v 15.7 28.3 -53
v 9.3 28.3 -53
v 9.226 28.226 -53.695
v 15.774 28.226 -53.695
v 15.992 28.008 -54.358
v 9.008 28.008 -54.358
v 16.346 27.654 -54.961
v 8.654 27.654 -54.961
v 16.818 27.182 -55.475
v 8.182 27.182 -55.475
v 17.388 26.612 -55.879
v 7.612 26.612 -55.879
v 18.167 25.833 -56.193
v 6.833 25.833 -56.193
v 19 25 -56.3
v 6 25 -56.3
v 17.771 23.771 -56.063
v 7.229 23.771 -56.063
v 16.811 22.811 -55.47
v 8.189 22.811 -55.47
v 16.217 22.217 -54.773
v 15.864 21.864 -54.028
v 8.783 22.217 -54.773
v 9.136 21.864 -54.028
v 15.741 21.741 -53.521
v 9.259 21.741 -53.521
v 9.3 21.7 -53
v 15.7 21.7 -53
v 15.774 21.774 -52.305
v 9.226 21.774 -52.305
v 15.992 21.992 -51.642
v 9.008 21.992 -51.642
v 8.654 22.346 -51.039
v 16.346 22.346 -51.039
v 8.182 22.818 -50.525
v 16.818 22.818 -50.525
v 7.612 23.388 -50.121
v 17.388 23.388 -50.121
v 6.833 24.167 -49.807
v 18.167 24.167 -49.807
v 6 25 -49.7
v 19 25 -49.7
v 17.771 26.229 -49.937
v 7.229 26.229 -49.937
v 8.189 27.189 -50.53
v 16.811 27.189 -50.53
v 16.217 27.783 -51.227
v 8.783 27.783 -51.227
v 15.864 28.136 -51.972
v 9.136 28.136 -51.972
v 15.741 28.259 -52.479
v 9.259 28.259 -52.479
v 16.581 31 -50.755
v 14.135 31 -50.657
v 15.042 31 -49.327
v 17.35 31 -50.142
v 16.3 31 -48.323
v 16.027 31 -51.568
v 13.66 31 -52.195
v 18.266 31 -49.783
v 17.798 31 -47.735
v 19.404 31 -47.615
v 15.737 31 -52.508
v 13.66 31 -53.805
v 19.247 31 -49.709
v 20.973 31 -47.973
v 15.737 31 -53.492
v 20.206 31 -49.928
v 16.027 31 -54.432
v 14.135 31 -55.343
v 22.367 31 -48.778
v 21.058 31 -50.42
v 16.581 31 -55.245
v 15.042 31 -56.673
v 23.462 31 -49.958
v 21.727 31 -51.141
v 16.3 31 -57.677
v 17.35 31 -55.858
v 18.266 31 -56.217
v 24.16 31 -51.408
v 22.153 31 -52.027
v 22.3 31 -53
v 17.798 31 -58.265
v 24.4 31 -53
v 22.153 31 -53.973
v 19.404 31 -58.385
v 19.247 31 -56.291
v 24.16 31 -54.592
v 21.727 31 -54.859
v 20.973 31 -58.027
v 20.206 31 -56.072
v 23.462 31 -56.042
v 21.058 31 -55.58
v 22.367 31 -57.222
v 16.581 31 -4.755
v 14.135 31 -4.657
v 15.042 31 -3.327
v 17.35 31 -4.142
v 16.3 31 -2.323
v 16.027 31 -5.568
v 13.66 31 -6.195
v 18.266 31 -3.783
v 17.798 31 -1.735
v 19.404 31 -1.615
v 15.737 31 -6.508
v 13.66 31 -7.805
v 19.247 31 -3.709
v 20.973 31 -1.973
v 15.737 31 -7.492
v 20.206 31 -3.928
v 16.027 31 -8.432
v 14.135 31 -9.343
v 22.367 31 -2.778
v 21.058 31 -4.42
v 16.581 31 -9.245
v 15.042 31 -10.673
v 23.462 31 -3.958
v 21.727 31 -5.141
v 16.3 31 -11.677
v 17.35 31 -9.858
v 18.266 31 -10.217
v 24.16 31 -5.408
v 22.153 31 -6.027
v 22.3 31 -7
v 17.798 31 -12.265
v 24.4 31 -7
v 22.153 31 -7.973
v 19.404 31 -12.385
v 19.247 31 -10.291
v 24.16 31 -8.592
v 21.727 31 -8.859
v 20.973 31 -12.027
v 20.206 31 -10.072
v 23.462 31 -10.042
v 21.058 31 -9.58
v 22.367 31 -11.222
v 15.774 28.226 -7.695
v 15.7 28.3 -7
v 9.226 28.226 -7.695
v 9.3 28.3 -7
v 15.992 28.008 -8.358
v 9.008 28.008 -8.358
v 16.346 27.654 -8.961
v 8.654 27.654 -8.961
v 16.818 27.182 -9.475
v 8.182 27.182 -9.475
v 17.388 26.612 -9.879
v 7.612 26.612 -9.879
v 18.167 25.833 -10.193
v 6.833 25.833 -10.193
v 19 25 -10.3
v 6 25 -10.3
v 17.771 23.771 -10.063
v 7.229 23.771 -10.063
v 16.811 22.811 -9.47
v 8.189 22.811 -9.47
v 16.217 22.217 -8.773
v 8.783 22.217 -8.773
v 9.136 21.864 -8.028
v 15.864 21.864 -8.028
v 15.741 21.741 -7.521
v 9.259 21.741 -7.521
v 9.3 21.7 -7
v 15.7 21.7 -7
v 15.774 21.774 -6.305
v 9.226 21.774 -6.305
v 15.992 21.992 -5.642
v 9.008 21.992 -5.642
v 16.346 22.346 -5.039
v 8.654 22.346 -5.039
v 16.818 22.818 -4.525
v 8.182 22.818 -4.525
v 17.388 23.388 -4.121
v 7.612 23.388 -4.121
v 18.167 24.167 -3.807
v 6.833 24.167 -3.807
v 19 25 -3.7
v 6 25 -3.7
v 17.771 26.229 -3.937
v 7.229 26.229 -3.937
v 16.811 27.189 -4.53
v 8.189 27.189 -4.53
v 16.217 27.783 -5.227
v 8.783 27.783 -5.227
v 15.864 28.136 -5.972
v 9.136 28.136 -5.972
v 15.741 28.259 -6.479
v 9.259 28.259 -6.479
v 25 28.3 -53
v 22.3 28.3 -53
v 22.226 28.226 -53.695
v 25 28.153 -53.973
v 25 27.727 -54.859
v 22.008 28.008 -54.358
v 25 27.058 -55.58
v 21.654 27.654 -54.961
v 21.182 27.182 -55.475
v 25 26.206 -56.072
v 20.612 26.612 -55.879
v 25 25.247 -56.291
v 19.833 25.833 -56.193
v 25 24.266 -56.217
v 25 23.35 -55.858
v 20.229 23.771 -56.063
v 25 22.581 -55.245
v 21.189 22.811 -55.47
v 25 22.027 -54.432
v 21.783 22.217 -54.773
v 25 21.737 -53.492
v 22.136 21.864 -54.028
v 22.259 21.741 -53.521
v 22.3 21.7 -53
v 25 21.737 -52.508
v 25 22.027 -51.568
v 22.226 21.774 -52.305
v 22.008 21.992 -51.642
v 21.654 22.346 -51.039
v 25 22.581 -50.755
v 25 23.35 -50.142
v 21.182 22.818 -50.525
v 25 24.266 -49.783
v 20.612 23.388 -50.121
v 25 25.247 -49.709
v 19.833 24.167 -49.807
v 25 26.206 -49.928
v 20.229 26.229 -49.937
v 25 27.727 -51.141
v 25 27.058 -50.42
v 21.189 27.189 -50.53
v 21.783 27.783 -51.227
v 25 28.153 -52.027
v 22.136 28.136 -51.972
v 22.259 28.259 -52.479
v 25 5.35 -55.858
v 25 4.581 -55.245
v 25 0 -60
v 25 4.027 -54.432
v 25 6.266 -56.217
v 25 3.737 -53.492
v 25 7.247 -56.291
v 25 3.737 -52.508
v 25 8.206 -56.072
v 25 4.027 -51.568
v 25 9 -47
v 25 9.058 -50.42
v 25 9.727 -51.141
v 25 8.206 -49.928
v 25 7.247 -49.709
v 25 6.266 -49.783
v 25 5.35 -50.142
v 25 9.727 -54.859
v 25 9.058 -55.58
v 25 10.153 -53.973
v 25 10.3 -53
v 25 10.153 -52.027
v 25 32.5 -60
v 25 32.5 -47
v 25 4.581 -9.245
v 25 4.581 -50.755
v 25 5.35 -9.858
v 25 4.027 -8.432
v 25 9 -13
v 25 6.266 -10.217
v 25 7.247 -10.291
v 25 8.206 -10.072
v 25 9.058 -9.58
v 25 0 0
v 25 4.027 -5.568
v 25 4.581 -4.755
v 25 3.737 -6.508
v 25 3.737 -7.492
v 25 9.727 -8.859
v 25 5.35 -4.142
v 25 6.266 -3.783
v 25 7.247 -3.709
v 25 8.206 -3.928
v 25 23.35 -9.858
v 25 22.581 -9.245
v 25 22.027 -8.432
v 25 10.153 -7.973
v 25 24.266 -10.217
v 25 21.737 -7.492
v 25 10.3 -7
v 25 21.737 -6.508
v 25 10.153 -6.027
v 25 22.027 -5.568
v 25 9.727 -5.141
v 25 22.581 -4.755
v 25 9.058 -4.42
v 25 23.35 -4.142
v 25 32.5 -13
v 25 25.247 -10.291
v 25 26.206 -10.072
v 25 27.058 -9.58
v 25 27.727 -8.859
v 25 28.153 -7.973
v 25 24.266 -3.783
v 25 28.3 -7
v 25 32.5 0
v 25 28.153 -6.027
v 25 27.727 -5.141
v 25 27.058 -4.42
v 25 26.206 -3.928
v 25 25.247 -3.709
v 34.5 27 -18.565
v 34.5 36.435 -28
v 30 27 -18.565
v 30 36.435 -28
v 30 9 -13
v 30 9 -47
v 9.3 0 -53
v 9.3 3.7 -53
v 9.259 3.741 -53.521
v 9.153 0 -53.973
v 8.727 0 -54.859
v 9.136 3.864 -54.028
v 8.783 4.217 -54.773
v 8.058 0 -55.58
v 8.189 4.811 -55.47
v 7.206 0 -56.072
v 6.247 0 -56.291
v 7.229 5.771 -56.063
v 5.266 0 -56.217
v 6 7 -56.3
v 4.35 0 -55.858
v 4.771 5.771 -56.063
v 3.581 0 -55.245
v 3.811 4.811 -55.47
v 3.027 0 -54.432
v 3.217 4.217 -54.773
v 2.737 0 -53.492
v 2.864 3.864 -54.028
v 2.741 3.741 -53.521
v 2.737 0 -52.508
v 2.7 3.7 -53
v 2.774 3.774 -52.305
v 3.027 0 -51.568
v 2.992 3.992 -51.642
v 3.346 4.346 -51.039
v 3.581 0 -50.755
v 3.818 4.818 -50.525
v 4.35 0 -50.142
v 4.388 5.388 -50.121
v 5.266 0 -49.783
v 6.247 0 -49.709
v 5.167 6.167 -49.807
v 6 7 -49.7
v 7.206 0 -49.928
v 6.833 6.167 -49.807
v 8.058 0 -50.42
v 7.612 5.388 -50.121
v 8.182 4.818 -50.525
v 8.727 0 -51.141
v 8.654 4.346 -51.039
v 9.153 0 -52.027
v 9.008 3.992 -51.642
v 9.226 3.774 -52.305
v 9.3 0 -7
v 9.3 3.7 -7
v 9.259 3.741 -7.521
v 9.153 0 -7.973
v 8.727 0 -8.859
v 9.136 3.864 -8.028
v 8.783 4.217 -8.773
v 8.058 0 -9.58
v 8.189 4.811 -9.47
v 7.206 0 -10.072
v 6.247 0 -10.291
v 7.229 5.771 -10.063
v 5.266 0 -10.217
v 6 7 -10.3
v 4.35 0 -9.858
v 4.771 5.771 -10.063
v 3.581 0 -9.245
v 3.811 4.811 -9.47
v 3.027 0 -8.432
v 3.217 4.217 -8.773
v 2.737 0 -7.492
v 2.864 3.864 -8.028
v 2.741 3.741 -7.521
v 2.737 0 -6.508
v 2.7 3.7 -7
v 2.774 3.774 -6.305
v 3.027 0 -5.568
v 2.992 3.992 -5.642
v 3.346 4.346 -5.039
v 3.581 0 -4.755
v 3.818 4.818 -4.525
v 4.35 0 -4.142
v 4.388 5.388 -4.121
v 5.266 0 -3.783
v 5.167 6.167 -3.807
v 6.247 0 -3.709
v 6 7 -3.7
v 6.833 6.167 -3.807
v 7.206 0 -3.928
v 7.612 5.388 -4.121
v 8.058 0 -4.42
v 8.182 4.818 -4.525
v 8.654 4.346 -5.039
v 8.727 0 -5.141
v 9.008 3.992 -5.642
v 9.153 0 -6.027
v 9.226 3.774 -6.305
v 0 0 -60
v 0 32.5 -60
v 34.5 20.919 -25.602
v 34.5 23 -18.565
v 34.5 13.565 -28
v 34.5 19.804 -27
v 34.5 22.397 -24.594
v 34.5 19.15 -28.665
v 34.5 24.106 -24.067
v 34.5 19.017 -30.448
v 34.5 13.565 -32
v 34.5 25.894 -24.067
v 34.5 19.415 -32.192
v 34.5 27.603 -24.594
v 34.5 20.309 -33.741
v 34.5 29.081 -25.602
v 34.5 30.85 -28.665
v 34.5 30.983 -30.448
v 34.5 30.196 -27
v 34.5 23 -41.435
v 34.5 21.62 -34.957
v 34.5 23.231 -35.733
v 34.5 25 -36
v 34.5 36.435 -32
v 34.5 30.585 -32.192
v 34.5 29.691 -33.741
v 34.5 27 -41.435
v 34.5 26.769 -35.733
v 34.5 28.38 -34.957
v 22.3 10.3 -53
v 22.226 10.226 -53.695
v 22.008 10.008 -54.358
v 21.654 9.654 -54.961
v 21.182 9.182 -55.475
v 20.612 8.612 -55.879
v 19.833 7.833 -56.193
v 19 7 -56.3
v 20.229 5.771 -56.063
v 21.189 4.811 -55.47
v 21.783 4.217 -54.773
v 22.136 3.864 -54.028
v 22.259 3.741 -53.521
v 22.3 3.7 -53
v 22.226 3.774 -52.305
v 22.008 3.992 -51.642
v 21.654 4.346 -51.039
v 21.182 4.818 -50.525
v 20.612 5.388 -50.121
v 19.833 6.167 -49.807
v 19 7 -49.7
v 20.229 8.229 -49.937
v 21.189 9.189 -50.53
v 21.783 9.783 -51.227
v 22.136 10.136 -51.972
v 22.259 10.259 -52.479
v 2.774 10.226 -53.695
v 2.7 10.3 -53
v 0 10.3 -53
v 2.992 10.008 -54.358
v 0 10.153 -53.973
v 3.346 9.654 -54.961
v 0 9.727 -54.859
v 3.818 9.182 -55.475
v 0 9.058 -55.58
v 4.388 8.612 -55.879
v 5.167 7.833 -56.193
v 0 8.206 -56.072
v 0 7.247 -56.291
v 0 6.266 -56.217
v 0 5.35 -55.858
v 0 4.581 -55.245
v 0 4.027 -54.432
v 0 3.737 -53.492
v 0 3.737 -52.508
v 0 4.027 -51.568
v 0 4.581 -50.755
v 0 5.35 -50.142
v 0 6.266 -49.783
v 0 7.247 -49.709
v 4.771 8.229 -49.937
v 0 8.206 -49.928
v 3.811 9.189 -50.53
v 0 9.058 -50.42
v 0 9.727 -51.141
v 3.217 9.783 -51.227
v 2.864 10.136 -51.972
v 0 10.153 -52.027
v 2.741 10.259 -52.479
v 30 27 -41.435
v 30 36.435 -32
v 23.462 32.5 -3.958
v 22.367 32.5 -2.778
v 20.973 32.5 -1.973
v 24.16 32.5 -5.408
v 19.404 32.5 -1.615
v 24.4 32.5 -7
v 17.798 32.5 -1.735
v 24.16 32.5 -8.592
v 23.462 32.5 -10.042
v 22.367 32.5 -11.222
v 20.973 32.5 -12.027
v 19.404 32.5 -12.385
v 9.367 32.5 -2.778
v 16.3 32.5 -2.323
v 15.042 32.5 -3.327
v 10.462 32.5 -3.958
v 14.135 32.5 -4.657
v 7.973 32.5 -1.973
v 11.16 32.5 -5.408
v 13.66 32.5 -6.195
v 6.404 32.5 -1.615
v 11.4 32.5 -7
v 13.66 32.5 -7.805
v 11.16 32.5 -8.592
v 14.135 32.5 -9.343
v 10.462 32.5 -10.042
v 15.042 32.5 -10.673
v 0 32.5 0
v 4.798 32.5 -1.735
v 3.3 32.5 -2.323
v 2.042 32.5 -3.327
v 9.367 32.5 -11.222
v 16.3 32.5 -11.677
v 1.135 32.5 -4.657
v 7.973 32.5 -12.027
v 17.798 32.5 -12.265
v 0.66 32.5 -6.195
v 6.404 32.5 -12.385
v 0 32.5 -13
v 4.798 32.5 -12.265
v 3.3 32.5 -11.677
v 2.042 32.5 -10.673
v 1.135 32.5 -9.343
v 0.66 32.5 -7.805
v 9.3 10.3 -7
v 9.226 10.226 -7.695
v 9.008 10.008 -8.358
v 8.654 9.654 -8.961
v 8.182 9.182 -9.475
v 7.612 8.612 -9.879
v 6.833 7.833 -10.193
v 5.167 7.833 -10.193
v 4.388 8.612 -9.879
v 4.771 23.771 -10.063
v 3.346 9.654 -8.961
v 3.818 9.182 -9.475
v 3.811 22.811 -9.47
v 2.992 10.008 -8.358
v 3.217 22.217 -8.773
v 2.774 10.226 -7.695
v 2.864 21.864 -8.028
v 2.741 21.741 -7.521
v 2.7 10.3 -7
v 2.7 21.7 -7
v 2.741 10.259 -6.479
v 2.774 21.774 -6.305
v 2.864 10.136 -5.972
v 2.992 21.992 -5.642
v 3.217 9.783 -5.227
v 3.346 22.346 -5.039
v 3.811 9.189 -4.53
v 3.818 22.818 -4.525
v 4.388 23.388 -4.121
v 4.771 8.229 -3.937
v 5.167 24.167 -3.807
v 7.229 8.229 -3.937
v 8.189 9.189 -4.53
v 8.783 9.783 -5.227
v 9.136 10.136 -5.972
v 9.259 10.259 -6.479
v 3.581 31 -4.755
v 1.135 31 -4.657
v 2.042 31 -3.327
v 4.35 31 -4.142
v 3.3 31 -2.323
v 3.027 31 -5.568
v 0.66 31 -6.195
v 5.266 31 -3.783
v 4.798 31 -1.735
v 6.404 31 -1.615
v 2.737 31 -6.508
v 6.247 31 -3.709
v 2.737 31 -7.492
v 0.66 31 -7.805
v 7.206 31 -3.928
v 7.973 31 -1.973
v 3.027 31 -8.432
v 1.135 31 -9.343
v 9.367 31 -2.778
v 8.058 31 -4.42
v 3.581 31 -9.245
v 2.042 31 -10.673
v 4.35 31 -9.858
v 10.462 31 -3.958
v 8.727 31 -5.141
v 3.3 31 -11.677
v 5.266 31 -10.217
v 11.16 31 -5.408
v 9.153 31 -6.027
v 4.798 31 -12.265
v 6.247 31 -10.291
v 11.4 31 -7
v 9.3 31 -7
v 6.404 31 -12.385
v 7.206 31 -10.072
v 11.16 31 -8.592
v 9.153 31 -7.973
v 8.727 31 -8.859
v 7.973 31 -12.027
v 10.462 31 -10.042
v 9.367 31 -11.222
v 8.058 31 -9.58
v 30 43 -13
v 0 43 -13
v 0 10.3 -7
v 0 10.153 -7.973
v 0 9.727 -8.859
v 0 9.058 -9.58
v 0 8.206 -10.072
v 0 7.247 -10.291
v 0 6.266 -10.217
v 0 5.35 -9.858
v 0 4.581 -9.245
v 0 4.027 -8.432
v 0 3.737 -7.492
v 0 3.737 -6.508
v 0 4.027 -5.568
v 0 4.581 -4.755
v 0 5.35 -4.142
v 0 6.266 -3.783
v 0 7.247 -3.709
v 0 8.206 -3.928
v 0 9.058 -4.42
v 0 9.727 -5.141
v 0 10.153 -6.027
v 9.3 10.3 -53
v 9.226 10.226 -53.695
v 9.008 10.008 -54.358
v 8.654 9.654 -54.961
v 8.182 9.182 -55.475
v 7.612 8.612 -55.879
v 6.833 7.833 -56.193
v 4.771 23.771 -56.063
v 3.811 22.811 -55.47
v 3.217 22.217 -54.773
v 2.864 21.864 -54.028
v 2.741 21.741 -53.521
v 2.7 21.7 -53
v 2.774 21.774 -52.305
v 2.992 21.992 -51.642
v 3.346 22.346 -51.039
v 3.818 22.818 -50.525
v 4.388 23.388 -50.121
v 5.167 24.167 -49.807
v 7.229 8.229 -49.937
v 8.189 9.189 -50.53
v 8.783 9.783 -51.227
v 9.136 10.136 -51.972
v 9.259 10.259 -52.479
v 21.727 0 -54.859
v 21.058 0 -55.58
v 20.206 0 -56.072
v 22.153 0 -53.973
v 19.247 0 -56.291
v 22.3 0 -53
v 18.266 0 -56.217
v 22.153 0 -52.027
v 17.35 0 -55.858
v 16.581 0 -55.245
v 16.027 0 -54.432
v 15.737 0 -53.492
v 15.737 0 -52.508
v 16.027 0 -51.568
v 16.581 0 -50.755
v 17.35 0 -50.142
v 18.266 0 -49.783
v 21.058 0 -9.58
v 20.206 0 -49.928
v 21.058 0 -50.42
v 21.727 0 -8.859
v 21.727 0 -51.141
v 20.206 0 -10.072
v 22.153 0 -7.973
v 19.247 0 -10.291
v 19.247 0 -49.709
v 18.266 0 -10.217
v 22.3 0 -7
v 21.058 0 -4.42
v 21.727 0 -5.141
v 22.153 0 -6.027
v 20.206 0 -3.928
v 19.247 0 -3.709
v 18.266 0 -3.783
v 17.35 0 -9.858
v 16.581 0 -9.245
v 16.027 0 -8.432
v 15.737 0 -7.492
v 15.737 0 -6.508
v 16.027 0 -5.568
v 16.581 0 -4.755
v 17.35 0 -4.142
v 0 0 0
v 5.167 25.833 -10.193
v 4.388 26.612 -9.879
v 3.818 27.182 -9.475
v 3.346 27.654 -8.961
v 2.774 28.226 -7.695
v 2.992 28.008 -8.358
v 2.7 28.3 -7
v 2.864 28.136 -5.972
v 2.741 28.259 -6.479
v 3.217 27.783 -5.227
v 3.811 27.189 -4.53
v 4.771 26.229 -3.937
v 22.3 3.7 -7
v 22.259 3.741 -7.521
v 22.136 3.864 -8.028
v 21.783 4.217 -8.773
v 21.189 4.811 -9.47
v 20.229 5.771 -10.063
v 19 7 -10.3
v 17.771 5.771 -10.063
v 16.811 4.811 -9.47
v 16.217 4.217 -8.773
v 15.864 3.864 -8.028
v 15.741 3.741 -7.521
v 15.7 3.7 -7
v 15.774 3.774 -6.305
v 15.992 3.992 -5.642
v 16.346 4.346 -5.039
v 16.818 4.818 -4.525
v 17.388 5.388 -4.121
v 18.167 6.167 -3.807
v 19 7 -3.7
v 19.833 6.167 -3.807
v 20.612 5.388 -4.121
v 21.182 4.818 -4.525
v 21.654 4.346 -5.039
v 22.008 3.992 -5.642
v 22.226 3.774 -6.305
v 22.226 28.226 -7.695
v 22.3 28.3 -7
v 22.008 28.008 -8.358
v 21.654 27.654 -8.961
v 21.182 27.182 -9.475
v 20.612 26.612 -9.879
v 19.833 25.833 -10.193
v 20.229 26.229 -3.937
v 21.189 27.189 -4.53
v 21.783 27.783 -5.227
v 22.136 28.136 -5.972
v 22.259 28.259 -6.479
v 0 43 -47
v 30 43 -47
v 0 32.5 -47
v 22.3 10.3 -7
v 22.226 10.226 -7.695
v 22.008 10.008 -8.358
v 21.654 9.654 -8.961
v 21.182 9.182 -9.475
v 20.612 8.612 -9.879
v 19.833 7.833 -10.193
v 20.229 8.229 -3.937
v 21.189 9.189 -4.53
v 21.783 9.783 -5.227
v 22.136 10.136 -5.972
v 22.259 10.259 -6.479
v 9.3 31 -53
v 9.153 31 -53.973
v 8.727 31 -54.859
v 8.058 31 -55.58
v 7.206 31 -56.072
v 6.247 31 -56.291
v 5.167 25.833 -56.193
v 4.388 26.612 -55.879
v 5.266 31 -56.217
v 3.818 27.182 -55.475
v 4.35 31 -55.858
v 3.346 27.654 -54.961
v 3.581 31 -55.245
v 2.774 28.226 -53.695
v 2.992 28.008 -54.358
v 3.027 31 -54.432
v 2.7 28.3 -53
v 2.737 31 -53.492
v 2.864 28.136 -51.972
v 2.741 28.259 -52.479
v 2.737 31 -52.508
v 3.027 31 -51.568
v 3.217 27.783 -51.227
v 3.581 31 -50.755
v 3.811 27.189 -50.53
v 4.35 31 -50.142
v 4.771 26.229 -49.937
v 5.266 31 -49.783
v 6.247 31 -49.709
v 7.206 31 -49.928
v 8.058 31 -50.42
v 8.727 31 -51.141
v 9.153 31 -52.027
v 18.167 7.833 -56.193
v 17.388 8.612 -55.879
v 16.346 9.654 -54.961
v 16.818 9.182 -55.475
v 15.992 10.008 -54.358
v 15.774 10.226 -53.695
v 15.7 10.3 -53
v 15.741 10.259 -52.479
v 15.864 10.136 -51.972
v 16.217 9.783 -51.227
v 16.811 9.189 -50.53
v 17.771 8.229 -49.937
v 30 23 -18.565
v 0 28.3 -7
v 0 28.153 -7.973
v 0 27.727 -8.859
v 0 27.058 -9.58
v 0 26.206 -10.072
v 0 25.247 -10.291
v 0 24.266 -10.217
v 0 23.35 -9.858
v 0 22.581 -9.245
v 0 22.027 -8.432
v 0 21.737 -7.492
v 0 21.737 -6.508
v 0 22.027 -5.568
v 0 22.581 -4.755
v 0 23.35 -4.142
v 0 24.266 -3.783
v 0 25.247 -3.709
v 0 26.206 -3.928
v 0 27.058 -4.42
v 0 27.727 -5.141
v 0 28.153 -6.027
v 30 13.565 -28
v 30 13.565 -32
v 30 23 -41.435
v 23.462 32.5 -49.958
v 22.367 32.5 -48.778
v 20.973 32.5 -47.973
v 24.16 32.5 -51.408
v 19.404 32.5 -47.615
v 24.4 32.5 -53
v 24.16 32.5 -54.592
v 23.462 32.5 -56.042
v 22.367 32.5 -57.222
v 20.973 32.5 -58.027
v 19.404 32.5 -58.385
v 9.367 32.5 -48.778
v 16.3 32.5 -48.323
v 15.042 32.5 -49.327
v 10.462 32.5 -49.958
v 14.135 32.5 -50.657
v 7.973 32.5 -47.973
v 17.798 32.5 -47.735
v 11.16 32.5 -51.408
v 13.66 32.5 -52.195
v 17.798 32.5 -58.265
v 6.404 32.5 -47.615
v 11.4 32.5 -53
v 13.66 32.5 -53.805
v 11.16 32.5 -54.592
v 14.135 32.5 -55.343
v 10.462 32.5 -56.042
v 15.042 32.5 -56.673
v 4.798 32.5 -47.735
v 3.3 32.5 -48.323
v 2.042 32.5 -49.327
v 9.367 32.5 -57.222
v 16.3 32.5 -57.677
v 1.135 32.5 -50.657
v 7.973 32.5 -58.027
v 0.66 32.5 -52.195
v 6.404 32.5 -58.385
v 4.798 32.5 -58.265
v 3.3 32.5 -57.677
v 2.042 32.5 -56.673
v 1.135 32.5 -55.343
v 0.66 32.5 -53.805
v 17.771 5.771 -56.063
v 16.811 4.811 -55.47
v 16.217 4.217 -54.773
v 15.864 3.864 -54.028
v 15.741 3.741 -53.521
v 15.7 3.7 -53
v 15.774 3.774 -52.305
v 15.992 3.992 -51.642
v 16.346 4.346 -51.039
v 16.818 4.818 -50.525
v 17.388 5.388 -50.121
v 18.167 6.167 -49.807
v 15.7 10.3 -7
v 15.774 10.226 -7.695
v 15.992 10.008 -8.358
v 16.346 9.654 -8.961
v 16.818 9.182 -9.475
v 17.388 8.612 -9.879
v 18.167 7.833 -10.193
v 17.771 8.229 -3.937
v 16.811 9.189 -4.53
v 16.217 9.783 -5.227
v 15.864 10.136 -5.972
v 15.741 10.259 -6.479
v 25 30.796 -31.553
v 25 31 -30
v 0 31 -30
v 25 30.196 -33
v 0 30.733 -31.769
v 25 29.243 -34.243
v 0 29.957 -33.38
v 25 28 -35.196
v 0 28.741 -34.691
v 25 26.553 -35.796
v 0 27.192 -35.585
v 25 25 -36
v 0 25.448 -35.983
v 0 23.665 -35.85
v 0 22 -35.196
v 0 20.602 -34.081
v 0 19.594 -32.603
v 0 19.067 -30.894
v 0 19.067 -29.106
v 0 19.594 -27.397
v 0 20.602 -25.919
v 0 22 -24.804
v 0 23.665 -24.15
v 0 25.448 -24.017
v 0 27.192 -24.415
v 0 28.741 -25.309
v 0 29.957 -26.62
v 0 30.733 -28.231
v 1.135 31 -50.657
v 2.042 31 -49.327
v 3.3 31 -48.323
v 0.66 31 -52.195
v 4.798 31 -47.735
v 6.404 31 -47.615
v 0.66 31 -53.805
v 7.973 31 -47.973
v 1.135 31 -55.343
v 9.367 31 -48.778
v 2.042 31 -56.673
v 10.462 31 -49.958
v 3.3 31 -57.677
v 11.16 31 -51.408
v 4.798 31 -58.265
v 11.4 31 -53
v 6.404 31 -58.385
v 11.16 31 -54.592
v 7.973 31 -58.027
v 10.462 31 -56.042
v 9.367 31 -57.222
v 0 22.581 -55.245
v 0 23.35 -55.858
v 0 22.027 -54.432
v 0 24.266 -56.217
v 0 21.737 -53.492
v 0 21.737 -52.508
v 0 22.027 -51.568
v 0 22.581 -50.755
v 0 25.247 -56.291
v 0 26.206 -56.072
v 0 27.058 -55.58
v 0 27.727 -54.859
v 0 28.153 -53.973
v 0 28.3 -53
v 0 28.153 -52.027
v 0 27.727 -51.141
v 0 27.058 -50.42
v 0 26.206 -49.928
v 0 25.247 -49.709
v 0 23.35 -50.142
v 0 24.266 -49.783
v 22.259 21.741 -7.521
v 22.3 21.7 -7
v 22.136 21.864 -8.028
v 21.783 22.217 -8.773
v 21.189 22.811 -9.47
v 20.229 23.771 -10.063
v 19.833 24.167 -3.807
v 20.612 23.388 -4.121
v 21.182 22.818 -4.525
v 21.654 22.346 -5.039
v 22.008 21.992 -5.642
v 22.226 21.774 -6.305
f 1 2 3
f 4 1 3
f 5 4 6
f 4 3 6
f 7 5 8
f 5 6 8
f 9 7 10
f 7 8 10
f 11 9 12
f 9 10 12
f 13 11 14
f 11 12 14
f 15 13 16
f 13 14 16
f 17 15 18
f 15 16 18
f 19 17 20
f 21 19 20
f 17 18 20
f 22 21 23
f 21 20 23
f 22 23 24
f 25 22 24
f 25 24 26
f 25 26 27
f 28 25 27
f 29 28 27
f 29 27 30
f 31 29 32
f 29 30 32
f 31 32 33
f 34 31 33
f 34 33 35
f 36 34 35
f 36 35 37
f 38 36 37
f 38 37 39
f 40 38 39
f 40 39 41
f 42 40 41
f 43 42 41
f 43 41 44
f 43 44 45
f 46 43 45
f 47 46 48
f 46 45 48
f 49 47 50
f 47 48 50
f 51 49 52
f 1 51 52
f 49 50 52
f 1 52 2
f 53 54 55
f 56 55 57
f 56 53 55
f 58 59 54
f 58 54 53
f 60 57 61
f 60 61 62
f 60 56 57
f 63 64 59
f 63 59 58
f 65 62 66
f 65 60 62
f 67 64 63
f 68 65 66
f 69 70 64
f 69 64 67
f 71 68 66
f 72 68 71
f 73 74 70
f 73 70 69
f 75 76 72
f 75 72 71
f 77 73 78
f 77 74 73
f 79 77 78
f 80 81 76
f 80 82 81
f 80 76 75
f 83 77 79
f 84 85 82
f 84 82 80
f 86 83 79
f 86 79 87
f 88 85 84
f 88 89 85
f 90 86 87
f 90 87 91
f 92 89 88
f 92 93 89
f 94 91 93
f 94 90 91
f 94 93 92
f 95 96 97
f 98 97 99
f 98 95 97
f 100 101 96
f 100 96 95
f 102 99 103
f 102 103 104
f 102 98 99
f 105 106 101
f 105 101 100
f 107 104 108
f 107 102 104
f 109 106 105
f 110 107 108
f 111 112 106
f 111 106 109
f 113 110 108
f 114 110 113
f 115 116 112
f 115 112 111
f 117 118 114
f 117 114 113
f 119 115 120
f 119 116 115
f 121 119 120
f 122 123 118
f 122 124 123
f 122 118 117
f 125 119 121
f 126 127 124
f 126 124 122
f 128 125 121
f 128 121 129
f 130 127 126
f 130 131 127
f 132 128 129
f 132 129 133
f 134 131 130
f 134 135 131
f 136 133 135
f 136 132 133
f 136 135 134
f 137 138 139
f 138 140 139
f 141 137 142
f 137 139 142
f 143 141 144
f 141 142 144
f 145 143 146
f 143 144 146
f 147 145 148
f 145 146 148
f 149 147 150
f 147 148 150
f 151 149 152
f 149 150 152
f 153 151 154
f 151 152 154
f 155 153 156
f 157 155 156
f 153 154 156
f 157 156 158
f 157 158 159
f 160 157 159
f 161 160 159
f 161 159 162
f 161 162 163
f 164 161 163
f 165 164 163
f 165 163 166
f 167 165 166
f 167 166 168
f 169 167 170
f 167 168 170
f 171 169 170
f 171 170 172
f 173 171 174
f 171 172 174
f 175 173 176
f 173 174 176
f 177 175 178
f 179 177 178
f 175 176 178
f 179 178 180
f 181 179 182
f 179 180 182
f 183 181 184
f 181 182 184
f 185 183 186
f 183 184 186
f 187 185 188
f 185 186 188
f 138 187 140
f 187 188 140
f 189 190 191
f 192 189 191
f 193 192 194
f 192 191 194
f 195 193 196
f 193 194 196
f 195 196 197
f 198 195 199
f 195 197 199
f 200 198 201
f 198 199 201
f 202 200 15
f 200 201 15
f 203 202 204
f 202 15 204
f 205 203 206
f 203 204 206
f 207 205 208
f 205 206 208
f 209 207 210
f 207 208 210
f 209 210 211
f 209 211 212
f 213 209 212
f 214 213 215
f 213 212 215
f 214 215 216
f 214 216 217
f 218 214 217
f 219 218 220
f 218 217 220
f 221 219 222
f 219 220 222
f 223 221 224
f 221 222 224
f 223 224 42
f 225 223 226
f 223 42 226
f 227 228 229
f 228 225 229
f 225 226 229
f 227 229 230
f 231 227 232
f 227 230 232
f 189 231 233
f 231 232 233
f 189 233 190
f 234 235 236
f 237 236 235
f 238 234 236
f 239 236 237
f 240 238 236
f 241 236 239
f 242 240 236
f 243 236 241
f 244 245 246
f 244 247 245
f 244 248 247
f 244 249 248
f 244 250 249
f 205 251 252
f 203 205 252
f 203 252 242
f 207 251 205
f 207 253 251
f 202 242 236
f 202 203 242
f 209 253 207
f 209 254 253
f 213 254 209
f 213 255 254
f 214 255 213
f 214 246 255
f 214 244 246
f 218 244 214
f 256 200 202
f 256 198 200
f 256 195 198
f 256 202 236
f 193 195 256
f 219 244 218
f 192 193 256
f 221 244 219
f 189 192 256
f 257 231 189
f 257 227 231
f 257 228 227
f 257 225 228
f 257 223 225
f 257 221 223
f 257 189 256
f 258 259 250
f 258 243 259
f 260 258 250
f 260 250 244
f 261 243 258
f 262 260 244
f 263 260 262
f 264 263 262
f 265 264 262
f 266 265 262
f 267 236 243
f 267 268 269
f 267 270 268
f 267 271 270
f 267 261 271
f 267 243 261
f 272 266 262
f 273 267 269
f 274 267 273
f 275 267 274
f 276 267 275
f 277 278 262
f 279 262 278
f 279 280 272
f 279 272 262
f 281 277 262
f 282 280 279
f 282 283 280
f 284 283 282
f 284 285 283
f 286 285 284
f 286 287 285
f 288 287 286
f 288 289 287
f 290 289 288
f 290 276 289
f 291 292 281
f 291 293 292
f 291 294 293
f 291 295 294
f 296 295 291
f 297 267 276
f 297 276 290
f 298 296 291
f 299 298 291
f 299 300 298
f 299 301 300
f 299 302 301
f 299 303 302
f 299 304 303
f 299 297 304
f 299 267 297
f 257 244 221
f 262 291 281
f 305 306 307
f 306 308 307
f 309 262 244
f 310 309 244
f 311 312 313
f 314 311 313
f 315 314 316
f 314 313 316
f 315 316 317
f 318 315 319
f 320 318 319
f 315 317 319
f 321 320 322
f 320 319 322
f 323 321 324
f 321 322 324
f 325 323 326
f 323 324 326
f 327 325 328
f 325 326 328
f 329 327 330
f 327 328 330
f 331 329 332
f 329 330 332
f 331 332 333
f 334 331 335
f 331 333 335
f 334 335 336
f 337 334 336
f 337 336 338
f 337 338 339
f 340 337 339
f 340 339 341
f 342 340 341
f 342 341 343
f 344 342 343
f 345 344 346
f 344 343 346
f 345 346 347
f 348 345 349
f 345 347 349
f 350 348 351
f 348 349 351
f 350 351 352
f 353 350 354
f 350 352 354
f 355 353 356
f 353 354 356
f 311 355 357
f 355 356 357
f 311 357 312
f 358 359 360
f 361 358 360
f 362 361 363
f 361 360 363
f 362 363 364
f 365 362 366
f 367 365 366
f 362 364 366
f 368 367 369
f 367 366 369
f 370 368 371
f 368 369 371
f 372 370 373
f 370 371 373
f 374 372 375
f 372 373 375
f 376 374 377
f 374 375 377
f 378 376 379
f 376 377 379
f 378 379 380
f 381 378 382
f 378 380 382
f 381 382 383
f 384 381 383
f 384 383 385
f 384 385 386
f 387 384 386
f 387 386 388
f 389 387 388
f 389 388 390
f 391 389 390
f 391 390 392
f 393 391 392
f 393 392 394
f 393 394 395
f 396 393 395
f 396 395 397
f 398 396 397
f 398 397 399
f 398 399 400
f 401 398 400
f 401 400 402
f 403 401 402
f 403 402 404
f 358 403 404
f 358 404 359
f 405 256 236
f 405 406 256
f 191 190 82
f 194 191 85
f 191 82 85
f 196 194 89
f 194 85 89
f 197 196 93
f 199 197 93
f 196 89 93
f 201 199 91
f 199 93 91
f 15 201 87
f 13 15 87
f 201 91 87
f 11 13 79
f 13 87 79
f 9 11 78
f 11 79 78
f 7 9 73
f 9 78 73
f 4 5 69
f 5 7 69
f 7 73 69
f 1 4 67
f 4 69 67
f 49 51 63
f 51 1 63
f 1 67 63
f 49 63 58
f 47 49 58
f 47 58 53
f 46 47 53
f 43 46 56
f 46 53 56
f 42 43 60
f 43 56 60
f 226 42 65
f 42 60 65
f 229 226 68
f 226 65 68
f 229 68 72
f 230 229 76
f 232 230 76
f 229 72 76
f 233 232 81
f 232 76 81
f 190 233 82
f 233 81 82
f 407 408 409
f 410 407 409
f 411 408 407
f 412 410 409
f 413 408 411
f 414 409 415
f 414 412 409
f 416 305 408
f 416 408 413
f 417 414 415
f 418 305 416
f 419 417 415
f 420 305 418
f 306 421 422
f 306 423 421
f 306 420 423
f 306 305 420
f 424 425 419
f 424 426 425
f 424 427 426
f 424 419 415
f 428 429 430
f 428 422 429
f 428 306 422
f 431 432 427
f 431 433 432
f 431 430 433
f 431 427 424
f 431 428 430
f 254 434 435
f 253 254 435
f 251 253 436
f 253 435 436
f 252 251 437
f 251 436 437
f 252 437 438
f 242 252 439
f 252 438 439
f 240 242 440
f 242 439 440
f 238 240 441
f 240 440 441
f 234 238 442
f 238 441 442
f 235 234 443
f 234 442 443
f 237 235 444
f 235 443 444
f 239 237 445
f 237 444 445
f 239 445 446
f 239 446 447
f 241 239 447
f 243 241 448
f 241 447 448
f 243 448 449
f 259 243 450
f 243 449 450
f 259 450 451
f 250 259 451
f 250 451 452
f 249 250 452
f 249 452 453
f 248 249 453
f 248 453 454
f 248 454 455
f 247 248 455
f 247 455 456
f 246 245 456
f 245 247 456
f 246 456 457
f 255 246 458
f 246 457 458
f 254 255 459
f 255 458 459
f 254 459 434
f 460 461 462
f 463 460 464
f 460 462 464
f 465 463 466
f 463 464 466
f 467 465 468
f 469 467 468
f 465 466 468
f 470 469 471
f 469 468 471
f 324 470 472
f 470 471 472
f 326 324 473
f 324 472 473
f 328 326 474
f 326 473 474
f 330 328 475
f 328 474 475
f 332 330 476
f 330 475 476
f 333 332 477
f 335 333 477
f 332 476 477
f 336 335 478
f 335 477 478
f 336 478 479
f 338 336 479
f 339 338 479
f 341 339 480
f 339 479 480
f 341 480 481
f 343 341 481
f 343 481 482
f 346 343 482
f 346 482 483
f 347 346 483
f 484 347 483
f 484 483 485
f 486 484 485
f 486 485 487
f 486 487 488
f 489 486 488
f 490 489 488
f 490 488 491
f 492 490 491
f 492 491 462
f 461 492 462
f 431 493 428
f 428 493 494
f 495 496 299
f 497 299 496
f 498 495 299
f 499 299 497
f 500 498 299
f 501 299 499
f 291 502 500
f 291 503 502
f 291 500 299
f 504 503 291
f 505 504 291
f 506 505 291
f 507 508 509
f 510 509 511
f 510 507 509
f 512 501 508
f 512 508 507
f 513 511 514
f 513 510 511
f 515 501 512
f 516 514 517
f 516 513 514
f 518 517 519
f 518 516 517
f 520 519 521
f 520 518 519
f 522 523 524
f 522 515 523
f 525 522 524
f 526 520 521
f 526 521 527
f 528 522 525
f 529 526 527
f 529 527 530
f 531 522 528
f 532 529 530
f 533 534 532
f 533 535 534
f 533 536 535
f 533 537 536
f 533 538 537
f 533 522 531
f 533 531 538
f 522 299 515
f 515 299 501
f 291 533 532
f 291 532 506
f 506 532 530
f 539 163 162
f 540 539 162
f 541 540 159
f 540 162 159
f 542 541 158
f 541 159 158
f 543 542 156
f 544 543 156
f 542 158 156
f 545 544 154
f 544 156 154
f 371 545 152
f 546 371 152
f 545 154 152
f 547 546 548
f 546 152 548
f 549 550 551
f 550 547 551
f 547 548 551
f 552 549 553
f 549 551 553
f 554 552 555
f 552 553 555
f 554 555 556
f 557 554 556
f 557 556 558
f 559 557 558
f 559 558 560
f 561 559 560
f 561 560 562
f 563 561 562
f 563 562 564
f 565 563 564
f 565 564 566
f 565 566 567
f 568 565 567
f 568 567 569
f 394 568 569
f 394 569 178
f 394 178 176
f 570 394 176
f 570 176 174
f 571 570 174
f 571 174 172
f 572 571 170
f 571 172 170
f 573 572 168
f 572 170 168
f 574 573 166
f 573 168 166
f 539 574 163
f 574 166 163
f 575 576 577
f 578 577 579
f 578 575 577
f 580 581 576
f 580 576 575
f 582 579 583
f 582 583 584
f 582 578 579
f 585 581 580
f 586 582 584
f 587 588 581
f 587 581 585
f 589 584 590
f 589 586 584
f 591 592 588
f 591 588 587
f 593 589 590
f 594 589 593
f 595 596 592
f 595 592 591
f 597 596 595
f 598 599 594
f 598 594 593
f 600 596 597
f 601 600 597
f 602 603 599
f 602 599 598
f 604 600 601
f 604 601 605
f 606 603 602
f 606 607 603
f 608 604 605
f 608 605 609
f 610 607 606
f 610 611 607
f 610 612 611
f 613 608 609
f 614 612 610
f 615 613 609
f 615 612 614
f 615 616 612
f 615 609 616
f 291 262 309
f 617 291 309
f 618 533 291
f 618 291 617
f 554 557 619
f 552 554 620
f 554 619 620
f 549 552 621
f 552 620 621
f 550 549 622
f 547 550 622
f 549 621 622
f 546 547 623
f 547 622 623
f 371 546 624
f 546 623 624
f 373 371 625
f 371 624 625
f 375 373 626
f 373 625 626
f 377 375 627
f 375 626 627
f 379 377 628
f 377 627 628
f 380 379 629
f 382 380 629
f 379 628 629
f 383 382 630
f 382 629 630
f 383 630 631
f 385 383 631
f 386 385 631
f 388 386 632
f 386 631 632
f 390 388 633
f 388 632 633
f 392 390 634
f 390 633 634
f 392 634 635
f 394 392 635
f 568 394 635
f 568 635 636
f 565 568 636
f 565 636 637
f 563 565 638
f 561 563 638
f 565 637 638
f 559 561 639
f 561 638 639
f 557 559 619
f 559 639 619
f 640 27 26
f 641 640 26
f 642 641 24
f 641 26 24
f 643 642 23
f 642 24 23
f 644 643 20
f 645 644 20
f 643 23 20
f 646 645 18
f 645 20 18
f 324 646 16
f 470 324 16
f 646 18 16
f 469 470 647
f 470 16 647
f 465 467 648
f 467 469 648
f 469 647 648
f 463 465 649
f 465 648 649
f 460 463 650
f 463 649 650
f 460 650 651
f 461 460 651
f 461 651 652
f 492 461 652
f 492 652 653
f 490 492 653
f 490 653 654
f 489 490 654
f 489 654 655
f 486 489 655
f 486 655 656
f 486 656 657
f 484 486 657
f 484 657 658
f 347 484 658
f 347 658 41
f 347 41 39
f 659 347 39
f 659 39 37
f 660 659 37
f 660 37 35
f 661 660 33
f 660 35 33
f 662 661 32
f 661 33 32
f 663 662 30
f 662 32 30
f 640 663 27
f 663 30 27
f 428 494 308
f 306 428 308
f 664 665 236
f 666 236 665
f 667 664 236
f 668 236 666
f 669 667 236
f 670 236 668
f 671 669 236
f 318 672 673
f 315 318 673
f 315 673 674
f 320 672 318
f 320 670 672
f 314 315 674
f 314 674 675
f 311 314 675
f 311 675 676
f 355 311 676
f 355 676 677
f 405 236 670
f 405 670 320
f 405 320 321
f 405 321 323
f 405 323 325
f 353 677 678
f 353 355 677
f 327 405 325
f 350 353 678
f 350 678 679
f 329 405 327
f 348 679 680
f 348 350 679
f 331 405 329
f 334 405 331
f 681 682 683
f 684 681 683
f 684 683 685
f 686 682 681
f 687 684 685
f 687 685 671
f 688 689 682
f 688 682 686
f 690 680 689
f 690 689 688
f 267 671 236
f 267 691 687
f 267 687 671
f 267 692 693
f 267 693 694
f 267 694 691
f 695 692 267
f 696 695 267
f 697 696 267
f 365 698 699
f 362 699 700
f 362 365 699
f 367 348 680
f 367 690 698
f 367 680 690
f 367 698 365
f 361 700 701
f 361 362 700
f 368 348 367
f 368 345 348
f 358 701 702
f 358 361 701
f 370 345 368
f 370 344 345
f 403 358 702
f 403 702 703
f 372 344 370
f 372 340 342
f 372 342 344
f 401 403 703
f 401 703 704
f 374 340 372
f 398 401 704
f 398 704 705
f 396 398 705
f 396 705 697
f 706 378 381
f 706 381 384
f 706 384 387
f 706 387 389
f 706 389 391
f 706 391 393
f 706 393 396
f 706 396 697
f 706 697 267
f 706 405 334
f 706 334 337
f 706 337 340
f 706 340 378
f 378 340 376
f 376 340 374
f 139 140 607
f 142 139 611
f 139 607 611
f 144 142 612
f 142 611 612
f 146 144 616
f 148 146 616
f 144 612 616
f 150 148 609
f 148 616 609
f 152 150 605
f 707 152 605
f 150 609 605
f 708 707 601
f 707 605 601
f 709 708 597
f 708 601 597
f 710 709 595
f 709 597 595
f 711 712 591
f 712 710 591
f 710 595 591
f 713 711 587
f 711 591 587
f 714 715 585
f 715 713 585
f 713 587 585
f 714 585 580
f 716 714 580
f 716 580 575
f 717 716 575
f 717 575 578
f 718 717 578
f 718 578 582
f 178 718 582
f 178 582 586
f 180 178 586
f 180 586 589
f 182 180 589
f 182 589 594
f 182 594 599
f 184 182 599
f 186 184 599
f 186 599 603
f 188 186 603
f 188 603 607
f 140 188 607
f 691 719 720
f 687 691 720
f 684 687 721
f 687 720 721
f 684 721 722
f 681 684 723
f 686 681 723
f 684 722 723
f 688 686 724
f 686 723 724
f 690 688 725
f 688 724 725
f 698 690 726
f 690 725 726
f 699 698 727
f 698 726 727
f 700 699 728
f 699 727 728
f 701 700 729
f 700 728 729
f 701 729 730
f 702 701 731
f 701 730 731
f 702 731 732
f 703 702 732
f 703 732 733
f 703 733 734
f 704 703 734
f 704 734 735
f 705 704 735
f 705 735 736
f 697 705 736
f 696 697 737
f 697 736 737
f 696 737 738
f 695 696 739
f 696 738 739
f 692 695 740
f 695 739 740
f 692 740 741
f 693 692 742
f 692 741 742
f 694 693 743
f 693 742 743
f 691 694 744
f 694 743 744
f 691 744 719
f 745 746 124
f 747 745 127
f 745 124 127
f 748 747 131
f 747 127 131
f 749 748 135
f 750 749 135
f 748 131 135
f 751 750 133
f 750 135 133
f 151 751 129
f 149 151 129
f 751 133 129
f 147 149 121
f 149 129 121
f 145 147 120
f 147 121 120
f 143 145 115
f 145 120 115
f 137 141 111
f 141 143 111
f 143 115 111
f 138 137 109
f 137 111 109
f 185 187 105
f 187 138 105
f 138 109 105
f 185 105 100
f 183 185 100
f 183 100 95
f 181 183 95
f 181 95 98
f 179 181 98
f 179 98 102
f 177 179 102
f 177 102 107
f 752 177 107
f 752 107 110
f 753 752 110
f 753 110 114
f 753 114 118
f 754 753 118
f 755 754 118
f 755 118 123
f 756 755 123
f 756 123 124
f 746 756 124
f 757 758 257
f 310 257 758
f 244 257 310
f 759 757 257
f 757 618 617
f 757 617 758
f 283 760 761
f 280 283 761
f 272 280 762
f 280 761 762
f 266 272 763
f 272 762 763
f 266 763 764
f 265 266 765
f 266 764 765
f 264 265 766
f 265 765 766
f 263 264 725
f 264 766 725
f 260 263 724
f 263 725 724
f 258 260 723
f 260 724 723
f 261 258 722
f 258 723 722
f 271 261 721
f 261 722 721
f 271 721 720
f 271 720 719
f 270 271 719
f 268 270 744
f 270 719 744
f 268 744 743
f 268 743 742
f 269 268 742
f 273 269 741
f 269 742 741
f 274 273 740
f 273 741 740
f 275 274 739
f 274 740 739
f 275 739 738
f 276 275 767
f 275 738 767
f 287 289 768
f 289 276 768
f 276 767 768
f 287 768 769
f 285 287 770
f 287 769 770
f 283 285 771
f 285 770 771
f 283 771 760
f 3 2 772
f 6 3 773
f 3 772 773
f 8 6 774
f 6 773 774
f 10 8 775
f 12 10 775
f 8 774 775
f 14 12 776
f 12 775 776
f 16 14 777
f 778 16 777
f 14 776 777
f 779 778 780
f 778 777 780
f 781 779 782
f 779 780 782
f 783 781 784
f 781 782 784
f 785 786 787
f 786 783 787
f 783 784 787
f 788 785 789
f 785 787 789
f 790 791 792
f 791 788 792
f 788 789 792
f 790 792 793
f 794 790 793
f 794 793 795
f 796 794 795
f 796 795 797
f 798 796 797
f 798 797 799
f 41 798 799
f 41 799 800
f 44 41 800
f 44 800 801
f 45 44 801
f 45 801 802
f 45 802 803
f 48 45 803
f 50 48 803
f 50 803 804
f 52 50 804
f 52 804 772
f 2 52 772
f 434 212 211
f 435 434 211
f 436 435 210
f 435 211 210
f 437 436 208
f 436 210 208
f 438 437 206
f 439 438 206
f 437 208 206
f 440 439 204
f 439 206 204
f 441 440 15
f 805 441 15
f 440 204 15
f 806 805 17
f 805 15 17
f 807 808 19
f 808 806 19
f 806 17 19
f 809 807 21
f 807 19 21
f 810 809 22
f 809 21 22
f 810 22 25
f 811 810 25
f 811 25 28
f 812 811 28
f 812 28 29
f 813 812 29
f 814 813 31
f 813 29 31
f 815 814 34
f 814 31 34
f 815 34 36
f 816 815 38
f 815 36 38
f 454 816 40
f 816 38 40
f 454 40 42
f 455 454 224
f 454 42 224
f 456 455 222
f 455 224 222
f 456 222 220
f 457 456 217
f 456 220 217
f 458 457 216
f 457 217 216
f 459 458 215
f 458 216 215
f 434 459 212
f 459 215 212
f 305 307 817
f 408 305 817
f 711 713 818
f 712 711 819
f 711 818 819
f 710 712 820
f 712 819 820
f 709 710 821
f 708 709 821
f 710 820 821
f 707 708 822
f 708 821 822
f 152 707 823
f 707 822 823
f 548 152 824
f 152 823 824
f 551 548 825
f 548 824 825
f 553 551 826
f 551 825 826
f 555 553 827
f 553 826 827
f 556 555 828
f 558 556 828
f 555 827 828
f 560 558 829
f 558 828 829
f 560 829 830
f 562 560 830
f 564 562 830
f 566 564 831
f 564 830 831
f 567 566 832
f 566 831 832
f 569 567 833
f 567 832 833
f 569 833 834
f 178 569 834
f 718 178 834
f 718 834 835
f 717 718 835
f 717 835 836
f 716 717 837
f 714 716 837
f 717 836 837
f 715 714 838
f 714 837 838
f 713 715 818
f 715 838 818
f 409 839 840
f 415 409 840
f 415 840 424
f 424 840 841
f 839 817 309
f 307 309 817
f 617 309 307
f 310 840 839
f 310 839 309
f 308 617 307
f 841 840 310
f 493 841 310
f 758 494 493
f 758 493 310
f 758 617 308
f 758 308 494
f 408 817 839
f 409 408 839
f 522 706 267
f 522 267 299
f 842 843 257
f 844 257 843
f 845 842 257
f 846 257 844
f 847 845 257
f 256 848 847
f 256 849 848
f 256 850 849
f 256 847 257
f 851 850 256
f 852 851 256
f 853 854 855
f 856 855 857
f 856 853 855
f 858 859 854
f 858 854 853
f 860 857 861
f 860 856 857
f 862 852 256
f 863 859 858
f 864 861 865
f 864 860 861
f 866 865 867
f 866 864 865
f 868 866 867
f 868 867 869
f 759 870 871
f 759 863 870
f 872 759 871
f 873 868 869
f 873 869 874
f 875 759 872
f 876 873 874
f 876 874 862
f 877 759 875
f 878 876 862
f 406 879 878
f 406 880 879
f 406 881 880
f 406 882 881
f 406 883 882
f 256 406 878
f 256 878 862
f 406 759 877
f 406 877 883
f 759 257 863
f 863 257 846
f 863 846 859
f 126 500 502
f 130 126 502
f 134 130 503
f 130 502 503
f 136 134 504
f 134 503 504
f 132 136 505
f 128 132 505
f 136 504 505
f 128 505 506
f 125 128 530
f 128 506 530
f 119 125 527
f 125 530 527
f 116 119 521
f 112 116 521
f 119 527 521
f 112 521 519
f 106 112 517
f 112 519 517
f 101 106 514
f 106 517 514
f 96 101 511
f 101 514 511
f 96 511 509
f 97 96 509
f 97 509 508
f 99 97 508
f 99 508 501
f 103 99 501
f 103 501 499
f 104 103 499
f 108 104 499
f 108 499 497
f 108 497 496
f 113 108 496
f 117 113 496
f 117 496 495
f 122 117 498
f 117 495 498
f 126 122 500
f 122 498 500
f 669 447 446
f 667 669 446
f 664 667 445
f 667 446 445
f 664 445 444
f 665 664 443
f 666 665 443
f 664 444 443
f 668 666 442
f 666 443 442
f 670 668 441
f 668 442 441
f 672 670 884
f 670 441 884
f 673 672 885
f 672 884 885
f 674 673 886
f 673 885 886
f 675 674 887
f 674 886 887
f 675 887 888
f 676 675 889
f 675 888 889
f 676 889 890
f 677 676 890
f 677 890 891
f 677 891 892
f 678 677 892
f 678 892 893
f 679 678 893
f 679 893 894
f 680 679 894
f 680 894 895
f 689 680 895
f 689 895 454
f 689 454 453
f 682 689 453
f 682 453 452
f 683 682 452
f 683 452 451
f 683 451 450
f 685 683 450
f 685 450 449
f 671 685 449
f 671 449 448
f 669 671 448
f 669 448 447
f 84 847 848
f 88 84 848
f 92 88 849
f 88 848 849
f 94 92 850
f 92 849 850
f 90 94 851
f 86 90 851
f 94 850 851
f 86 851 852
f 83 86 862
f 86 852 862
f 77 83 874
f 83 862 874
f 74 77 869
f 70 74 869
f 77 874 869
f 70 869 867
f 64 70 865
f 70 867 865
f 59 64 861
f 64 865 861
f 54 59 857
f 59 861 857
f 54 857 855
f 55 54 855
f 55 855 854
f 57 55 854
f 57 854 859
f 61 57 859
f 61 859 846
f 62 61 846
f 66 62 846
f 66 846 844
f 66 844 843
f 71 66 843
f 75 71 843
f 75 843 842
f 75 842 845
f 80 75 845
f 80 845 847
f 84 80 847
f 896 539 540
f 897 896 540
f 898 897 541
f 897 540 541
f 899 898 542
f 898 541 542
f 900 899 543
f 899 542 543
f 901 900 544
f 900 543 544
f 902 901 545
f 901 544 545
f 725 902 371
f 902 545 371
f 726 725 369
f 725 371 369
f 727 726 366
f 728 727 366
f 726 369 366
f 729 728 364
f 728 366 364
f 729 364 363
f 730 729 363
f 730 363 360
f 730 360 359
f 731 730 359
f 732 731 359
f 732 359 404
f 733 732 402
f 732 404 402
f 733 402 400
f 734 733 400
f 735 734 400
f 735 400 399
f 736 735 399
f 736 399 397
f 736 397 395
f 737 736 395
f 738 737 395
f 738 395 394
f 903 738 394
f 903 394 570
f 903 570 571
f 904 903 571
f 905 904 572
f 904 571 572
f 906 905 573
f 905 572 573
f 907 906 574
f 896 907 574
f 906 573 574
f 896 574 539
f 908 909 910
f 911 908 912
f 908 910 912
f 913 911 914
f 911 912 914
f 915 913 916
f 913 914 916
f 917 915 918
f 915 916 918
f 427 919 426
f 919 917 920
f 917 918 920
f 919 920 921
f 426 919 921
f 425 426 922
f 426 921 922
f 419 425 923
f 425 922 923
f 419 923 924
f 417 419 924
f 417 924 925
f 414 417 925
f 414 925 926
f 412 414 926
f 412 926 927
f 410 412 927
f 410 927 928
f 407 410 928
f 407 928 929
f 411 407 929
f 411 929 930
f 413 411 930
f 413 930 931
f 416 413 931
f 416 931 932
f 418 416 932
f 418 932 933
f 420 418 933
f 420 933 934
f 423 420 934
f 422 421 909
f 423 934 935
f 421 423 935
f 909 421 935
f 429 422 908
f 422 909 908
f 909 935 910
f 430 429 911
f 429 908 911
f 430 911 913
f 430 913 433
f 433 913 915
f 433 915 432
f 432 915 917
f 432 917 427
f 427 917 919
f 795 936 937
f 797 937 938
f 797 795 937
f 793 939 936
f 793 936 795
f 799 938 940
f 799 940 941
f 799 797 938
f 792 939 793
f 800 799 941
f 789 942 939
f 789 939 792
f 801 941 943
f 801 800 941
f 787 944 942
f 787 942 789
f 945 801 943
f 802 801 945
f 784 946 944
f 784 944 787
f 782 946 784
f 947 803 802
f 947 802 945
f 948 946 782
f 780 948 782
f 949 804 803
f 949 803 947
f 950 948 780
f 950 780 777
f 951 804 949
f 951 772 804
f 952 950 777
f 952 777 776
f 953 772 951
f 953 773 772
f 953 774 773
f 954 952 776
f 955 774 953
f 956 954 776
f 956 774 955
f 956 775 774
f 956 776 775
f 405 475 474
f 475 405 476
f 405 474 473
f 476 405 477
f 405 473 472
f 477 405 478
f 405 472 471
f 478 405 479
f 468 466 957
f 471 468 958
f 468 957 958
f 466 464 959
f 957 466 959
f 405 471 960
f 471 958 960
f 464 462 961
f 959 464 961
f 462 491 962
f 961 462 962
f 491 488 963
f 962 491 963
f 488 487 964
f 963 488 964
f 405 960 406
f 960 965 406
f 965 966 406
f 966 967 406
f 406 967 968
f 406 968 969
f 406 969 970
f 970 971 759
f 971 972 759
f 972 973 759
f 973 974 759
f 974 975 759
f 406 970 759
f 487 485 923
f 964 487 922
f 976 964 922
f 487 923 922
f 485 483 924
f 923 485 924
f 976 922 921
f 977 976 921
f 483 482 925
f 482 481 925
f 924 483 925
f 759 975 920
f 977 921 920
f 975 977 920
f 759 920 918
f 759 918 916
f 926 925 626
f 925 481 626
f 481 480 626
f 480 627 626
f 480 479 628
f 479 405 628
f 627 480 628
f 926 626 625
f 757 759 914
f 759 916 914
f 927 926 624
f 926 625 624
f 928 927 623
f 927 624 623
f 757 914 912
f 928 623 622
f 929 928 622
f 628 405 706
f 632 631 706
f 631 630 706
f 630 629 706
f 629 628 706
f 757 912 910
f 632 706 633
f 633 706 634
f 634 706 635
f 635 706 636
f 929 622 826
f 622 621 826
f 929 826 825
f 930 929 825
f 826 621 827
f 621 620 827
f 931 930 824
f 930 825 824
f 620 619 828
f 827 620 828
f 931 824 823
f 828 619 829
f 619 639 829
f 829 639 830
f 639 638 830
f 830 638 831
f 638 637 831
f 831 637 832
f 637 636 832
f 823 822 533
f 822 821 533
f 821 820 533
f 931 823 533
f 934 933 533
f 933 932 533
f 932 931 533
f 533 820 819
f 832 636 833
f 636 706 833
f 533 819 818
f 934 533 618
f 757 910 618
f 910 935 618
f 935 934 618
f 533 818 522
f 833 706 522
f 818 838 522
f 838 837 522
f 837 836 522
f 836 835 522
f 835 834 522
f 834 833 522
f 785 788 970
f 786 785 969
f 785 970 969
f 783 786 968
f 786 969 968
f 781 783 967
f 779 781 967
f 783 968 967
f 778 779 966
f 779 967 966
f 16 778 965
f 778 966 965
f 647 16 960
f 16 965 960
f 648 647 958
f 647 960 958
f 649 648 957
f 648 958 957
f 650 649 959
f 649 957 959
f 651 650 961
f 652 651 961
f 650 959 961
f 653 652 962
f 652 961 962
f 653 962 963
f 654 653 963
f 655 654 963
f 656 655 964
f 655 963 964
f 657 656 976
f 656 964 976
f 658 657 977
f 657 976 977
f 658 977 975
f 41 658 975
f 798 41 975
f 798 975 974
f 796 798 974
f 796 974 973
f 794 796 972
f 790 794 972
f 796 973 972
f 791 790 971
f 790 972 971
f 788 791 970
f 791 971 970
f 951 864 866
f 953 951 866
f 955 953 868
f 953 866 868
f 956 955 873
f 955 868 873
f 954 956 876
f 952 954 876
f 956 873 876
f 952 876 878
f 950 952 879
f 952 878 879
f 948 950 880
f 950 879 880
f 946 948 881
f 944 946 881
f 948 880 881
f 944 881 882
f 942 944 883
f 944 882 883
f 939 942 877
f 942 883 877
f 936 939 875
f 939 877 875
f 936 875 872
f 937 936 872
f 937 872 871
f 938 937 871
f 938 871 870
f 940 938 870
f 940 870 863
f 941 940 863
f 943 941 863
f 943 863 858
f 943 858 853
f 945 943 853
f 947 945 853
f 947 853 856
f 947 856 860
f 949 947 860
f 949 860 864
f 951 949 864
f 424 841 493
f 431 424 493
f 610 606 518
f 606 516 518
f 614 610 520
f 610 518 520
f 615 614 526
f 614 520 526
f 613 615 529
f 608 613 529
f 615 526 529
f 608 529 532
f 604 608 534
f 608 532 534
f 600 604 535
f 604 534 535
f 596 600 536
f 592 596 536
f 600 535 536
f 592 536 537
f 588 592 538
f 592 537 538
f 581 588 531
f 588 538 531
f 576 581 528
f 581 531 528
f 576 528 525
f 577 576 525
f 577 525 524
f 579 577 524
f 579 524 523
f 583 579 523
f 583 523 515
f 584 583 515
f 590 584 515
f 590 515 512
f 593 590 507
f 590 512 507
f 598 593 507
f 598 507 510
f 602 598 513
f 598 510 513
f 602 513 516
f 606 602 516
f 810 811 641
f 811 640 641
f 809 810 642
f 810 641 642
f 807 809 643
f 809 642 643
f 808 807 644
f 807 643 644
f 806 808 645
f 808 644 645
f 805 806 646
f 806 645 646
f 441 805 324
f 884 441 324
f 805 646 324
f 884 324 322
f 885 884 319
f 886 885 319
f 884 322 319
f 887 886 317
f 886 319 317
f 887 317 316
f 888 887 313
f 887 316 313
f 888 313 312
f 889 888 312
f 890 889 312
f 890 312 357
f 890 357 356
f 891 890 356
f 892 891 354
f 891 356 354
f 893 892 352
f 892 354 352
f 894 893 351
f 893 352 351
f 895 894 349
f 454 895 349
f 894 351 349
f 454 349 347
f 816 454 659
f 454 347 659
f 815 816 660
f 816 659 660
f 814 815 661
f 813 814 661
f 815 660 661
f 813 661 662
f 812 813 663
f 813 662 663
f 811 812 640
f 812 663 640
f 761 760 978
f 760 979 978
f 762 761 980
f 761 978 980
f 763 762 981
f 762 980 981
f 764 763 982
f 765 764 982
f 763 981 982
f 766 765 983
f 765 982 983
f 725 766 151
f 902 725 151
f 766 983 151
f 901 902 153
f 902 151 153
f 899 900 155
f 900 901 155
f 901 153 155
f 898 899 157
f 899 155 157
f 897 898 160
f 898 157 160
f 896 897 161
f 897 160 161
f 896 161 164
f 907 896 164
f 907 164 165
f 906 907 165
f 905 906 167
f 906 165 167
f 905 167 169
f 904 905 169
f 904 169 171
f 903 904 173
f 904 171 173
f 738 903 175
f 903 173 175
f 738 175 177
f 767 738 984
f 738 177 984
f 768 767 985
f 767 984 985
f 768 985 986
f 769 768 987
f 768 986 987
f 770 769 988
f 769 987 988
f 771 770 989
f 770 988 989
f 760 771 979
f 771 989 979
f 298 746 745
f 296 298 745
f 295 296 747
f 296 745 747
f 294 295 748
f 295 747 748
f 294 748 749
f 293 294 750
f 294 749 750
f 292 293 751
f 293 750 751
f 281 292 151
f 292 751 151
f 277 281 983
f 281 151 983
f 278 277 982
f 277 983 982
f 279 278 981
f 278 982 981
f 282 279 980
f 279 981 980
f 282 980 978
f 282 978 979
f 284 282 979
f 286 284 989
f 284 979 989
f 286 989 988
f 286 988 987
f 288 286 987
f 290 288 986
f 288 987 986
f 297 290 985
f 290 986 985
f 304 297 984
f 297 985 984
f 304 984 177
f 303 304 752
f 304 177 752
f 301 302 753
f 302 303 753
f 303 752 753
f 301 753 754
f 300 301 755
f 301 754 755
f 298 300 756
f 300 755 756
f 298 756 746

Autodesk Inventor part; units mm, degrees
ref_plane "YZ Plane" through (0, 0, 0) normal (1, 0, 0) x (0, 1, 0)
ref_plane "XZ Plane" through (0, 0, 0) normal (0, 1, 0) x (-1, 0, 0)
ref_plane "XY Plane" through (0, 0, 0) normal (0, 0, 1) x (1, 0, 0)
sketch "Sketch1" plane through (0, 0, 0) normal (1, 0, 0) x (0, 1, 0)
  line L0 (0, 0) -> (32.5, 0)
  line L1 (32.5, 0) -> (32.5, -13)
  line L2 (32.5, -60) -> (0, -60)
  line L3 (0, -60) -> (0, 0)
  circle A0 centre (25, -53) radius 3.3
  circle A1 centre (25, -7) radius 3.3
  circle A2 centre (7, -7) radius 3.3
  circle A3 centre (7, -53) radius 3.3
  line L4 (25, -7) -> (7, -7) construction
  line L5 (7, -7) -> (7, -53) construction
  line L6 (7, -53) -> (25, -53) construction
  line L7 (25, -53) -> (25, -7) construction
  line L8 (32.5, -13) -> (43, -13)
  line L9 (43, -13) -> (43, -47)
  line L10 (43, -47) -> (32.5, -47)
  line L11 (32.5, -47) -> (32.5, -60)
  line L12 (32.5, -13) -> (32.5, -47) construction
  circle A4 centre (25, -30) radius 6
  point P0 (32.5, -30)
  dimension "d0" = 60
  dimension "d1" = 6.6
  dimension "d2" = 18
  dimension "d3" = 46
  dimension "d4" = 25
  dimension "d5" = 32.5
  dimension "d6" = 34
  dimension "d7" = 43
  dimension "d8" = 12
extrude "Extrusion1" add sketch "Sketch1" along normal blind 25
sketch "Sketch2" plane through (25, 0, 0) normal (1, 0, 0) x (0, 0, -1)
  line L0 (47, 43) -> (13, 43) projected
  line L1 (13, 43) -> (13, 9)
  line L2 (13, 9) -> (47, 9)
  line L3 (47, 9) -> (47, 43)
  circle A0 centre (30, 25) radius 6 projected
  point P0 (0, 0)
extrude "Extrusion2" add sketch "Sketch2" along normal blind 5
sketch "Sketch3" plane through (30, 0, 0) normal (1, 0, 0) x (0, 0, -1)
  circle A0 centre (30, 25) radius 6 projected
  circle A1 centre (30, 25) radius 6 projected
  line L0 (18.565, 27) -> (18.565, 23)
  line L1 (18.565, 23) -> (28, 13.565)
  line L2 (28, 13.565) -> (32, 13.565)
  line L3 (32, 13.565) -> (41.435, 23)
  line L4 (41.435, 23) -> (41.435, 27)
  line L5 (41.435, 27) -> (32, 36.435)
  line L6 (32, 36.435) -> (28, 36.435)
  line L7 (28, 36.435) -> (18.565, 27)
  point P0 (0, 0)
  point P1 (30, 13.565)
  point P2 (18.565, 25)
  point P3 (36.7175, 31.7175)
  point P4 (23.2825, 18.2825)
  dimension "d14" = 135
  dimension "d15" = 19
  dimension "d16" = 4
extrude "Extrusion3" add sketch "Sketch3" along normal blind 4.5
sketch "Sketch4" plane through (0, 32.5, -47) normal (0, 1, 0) x (1, 0, 0)
  circle A0 centre (6, -40) radius 5.4
  point P0 (0, -47)
  dimension "d19" = 10.8
  dimension "d20" = 6
  dimension "d21" = 7
extrude "Extrusion4" cut sketch "Sketch4" against normal blind 1.5
sketch "Sketch5" plane through (6, 31, -7) normal (0, 1, 0) x (1, 0, 0)
  circle A0 centre (0, 0) radius 3.3
  circle A1 centre (0, 0) radius 5.4 construction
  point P0 (-6, -7)
  dimension "d24" = 6.6
extrude "Extrusion5" cut sketch "Sketch5" against normal up to surface (31 mm away)
pattern_linear "Rectangular Pattern1" count 2 spacing 13 along (1, 0, 0) count 2 spacing -46 along (0, 0, 1) of "Extrusion5", "Extrusion4"
properties part number "BK10_Frame"
